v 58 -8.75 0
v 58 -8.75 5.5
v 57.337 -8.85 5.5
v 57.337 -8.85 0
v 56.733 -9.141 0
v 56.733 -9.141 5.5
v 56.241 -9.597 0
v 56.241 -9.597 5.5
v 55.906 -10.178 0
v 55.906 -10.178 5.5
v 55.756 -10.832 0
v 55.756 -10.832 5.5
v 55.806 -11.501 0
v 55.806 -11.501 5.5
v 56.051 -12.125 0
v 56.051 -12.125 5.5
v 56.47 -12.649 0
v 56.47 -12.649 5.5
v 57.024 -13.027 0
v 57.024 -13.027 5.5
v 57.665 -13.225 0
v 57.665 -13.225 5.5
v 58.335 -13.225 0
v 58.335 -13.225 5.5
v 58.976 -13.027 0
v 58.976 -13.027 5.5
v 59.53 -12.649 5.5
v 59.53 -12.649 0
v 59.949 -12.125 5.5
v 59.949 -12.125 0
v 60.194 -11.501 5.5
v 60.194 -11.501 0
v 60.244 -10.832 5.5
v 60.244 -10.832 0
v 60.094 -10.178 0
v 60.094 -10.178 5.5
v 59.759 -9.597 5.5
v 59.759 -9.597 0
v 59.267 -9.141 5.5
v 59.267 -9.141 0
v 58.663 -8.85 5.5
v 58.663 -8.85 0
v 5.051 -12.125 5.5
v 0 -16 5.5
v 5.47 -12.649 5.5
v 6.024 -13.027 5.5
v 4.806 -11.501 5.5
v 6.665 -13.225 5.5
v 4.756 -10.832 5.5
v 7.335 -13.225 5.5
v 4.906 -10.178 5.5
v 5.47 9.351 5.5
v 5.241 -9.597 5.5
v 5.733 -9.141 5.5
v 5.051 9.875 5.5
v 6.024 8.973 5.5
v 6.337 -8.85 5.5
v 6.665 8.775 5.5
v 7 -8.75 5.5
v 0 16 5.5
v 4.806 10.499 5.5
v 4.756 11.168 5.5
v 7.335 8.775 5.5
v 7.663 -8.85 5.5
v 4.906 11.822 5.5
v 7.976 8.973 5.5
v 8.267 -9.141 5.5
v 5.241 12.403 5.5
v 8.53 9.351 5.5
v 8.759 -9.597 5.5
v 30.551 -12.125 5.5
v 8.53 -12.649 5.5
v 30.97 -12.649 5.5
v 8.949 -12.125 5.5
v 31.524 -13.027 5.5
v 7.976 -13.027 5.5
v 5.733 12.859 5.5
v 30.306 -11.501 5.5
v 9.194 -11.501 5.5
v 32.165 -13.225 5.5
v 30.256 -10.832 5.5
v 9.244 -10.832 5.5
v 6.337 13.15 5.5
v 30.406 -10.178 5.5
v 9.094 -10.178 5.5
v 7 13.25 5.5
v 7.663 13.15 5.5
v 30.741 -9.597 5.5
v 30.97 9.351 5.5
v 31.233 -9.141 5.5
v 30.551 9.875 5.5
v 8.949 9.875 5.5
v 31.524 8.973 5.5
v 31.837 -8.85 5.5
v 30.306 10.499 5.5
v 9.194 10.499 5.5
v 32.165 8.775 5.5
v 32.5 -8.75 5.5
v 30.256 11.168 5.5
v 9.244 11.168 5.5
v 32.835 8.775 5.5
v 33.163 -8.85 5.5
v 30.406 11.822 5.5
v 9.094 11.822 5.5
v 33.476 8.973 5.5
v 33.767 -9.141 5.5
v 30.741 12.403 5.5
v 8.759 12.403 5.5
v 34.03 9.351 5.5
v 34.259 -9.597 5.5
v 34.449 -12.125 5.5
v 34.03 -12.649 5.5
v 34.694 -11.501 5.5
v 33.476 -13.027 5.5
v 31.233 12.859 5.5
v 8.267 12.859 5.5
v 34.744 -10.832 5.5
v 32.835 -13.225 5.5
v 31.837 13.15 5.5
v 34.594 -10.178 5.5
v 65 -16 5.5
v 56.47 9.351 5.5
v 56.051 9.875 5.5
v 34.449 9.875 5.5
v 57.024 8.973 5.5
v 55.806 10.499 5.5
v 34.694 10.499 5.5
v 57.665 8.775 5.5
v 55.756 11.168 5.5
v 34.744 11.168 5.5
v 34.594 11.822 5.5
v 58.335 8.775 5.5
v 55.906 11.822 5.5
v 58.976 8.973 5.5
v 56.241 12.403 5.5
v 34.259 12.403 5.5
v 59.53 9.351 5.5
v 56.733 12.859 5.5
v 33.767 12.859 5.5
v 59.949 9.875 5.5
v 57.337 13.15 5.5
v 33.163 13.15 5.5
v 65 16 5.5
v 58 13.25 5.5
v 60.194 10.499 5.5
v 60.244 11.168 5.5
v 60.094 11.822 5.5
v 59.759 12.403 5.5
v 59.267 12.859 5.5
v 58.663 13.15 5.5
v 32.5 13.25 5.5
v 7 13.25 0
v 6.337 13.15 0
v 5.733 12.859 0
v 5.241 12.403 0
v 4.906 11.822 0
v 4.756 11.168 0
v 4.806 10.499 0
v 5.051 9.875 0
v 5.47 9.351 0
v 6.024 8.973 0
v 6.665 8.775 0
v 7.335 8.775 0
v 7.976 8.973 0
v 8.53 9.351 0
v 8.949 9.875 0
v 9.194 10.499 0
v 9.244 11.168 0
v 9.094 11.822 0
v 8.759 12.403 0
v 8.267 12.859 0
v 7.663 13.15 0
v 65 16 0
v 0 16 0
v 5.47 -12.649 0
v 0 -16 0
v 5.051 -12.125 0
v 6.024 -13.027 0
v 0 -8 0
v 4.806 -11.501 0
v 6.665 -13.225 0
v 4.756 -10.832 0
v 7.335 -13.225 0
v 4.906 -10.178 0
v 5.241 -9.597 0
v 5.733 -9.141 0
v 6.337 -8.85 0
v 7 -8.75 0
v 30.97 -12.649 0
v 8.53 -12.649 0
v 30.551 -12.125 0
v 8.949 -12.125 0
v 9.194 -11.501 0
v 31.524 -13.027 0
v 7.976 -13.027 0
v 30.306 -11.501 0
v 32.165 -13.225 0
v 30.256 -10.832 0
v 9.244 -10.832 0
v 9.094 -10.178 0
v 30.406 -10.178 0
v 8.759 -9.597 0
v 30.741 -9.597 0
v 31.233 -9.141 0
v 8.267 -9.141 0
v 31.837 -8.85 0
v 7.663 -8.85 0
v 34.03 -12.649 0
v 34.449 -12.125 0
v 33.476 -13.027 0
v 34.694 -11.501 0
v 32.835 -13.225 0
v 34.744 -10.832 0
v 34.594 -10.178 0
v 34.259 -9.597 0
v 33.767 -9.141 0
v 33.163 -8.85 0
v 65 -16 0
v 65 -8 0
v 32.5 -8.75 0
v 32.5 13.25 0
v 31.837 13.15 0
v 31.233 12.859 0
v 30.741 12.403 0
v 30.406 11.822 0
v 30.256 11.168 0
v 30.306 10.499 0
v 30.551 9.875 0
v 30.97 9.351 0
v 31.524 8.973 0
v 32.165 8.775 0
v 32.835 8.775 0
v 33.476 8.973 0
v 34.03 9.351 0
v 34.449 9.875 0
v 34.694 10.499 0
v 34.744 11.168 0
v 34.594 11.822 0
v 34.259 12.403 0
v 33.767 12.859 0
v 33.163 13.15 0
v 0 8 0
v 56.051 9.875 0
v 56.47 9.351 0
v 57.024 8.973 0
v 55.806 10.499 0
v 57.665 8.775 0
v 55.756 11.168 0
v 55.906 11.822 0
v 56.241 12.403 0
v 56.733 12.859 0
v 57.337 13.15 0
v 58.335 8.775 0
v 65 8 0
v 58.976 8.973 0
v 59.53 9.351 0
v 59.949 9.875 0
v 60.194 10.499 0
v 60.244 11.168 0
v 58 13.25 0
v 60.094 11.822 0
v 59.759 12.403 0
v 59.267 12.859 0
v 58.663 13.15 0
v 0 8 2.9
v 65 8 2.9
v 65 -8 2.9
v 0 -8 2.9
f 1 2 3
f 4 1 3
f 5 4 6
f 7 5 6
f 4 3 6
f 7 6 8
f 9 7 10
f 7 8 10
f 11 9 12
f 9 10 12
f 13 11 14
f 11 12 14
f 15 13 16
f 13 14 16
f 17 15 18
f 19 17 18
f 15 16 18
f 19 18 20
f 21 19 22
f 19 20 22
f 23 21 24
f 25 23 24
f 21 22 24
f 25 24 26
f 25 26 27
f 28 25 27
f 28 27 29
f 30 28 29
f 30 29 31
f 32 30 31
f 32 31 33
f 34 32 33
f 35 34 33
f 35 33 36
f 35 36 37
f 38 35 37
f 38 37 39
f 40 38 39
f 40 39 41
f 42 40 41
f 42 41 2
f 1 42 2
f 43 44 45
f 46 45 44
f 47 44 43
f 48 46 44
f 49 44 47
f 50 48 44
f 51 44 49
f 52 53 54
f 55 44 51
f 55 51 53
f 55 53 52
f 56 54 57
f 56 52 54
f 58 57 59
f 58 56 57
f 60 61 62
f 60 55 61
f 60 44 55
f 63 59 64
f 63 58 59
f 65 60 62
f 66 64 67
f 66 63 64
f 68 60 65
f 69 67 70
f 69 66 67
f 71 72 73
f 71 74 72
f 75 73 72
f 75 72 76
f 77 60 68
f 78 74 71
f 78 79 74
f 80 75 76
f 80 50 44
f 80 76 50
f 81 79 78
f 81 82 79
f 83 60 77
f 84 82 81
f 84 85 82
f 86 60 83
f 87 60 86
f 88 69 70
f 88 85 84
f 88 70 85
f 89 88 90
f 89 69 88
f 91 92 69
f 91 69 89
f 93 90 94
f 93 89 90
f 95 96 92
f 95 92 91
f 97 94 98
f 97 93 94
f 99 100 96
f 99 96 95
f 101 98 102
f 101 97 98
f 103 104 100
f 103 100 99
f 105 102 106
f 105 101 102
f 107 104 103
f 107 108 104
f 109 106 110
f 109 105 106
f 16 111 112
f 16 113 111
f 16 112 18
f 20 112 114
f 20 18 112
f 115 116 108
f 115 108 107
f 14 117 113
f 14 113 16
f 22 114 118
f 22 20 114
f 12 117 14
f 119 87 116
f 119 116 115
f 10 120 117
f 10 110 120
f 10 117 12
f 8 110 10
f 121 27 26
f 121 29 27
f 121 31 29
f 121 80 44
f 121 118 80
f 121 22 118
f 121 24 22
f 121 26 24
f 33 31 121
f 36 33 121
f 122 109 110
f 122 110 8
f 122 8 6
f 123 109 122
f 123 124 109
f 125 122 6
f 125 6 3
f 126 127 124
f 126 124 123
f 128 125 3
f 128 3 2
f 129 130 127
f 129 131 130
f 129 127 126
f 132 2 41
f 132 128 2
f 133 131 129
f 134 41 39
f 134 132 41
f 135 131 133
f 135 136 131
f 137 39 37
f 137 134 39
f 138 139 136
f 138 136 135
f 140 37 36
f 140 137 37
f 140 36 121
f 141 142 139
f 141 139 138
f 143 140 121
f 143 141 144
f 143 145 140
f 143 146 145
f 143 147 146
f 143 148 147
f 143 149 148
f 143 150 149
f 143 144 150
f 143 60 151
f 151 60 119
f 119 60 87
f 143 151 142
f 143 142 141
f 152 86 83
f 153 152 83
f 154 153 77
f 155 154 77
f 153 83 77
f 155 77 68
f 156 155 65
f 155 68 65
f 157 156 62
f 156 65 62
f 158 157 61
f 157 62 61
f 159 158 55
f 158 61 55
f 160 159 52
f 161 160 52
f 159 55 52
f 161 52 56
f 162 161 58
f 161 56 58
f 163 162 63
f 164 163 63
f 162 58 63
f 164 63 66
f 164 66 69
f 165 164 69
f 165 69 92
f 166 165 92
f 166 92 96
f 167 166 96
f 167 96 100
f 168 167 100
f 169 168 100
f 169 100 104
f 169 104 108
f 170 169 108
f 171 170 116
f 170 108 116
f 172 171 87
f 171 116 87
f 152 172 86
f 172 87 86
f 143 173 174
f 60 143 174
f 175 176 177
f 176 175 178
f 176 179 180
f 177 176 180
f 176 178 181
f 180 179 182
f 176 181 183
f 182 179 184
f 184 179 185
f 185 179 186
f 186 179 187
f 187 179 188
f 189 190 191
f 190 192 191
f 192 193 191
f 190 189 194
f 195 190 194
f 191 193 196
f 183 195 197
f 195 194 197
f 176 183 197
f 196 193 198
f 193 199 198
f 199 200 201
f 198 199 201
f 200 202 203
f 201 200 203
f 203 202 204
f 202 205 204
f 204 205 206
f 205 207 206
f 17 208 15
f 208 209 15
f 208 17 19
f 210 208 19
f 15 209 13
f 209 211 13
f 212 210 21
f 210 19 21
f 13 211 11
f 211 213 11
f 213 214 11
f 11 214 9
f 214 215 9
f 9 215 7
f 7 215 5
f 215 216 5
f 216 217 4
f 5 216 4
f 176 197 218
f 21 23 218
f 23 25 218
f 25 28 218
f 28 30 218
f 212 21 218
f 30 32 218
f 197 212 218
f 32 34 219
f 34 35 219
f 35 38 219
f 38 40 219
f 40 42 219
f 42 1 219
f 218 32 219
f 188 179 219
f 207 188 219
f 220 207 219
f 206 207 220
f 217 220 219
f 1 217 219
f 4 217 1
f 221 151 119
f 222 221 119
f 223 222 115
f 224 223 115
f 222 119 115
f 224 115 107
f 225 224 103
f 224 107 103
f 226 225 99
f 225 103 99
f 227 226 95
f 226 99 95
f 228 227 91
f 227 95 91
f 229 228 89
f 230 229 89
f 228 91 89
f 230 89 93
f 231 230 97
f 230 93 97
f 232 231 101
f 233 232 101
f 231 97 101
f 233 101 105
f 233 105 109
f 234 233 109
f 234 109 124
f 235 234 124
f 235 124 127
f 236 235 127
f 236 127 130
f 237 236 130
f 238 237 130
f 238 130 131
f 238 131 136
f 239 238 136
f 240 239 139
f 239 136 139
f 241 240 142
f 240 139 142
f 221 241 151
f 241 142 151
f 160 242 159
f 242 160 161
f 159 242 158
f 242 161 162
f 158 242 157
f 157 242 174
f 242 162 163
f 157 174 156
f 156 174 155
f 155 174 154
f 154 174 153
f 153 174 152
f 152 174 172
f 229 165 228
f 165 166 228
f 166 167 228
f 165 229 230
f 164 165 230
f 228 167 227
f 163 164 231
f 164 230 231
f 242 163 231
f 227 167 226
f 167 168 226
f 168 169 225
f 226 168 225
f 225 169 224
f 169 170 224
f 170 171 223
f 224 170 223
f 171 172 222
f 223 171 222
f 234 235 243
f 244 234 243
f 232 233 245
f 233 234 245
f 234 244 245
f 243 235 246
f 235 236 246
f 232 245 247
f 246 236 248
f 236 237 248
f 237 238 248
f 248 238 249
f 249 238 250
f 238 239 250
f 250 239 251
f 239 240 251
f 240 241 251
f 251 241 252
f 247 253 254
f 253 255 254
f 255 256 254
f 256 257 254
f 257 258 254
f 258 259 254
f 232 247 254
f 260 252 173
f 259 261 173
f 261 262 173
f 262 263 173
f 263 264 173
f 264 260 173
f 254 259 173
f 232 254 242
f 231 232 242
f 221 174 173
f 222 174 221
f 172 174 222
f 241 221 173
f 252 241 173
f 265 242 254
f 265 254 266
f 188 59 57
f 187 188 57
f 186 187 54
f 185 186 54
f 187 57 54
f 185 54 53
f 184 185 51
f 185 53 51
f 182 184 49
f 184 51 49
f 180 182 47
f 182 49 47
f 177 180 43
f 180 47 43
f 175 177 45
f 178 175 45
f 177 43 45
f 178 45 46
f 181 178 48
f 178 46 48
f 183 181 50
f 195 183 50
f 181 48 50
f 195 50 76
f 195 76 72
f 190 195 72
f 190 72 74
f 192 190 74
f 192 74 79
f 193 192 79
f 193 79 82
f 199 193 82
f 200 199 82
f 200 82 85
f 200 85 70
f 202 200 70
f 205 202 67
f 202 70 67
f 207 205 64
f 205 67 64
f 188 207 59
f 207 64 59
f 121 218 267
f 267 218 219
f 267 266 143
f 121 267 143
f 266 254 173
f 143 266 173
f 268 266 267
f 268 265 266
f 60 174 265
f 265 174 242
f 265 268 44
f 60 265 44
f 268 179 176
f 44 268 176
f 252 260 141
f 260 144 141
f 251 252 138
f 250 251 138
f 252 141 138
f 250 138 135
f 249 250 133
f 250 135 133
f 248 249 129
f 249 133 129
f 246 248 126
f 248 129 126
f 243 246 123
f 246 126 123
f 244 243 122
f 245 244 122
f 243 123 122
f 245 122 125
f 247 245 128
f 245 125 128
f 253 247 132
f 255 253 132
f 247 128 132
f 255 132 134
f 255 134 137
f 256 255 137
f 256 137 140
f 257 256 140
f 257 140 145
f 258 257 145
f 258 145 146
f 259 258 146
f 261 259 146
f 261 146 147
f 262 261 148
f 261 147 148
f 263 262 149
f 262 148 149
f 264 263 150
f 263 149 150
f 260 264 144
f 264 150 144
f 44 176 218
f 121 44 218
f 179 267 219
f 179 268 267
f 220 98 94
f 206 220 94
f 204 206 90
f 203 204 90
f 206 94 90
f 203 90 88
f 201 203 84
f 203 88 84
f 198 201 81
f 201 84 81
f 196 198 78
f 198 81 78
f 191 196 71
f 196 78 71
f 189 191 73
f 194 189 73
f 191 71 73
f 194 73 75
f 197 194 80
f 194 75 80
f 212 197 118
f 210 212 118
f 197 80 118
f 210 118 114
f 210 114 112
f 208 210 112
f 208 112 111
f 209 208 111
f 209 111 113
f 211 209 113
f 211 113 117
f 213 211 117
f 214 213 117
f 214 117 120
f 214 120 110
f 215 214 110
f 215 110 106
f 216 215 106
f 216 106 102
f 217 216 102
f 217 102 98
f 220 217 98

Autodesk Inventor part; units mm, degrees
sketch "Sketch_1" plane through (0, 0, 0) normal (0, 0, 1) x (1, 0, 0)
  line L0 (0, 16) -> (0, -16)
  line L1 (0, -16) -> (65, -16)
  line L2 (65, -16) -> (65, 16)
  line L3 (65, 16) -> (0, 16)
extrude "Extrusion1" add sketch "Sketch_1" along normal blind 5.5
sketch "Sketch2" plane through (0, 0, 0) normal (0, 0, -1) x (-1, 0, 0)
  point P0 (-7, 11)
hole "Hole1" at (7, 11, 0) direction (0, 0, 1) diameter 4.5 depth 5.5
pattern_linear "Rectangular Pattern1" count 3 spacing 25.5 along (1, 0, 0) count 2 spacing 22 along (0, -1, 0) of "Hole1"
sketch "Sketch_4" plane through (0, 0, 0) normal (1, 0, 0) x (0, 1, 0)
  line L0 (8, 2.9) -> (-8, 2.9)
  line L1 (-8, 2.9) -> (-8, 0)
  line L2 (-8, 0) -> (8, 0)
  line L3 (8, 0) -> (8, 2.9)
extrude "Extrusion2" cut sketch "Sketch_4" along normal blind 65
ref_plane "tbck_XY" through (0, 0, 0) normal (0, 0, 1) x (1, 0, 0)
ref_plane "tbck_YZ" through (0, 0, 0) normal (1, 0, 0) x (0, 1, 0)
ref_plane "tbck_ZX" through (0, 0, 0) normal (0, 1, 0) x (0, 0, 1)
ref_plane "tbck_hole_1_XY" through (7, -11, 5.5) normal (0, 0, 1) x (1, 0, 0)
ref_plane "tbck_hole_1_YZ" through (7, -11, 5.5) normal (1, 0, 0) x (0, 1, 0)
ref_plane "tbck_hole_1_ZX" through (7, -11, 5.5) normal (0, 1, 0) x (0, 0, 1)
ref_plane "tbck_hole_2_XY" through (32.5, -11, 5.5) normal (0, 0, 1) x (1, 0, 0)
ref_plane "tbck_hole_2_YZ" through (32.5, -11, 5.5) normal (1, 0, 0) x (0, 1, 0)
ref_plane "tbck_hole_2_ZX" through (32.5, -11, 5.5) normal (0, 1, 0) x (0, 0, 1)
ref_plane "tbck_hole_3_XY" through (58, -11, 5.5) normal (0, 0, 1) x (1, 0, 0)
ref_plane "tbck_hole_3_YZ" through (58, -11, 5.5) normal (1, 0, 0) x (0, 1, 0)
ref_plane "tbck_hole_3_ZX" through (58, -11, 5.5) normal (0, 1, 0) x (0, 0, 1)
ref_plane "tbck_holes_1_XY" through (7, 11, 5.5) normal (0, 0, 1) x (1, 0, 0)
ref_plane "tbck_holes_1_YZ" through (7, 11, 5.5) normal (1, 0, 0) x (0, 1, 0)
ref_plane "tbck_holes_1_ZX" through (7, 11, 5.5) normal (0, 1, 0) x (0, 0, 1)
ref_plane "tbck_holes_2_XY" through (32.5, 11, 5.5) normal (0, 0, 1) x (1, 0, 0)
ref_plane "tbck_holes_2_YZ" through (32.5, 11, 5.5) normal (1, 0, 0) x (0, 1, 0)
ref_plane "tbck_holes_2_ZX" through (32.5, 11, 5.5) normal (0, 1, 0) x (0, 0, 1)
ref_plane "tbck_holes_3_XY" through (58, 11, 5.5) normal (0, 0, 1) x (1, 0, 0)
ref_plane "tbck_holes_3_YZ" through (58, 11, 5.5) normal (1, 0, 0) x (0, 1, 0)
ref_plane "tbck_holes_3_ZX" through (58, 11, 5.5) normal (0, 1, 0) x (0, 0, 1)
properties part number "TBCKsupport_plate-MA5150_support_plate"
